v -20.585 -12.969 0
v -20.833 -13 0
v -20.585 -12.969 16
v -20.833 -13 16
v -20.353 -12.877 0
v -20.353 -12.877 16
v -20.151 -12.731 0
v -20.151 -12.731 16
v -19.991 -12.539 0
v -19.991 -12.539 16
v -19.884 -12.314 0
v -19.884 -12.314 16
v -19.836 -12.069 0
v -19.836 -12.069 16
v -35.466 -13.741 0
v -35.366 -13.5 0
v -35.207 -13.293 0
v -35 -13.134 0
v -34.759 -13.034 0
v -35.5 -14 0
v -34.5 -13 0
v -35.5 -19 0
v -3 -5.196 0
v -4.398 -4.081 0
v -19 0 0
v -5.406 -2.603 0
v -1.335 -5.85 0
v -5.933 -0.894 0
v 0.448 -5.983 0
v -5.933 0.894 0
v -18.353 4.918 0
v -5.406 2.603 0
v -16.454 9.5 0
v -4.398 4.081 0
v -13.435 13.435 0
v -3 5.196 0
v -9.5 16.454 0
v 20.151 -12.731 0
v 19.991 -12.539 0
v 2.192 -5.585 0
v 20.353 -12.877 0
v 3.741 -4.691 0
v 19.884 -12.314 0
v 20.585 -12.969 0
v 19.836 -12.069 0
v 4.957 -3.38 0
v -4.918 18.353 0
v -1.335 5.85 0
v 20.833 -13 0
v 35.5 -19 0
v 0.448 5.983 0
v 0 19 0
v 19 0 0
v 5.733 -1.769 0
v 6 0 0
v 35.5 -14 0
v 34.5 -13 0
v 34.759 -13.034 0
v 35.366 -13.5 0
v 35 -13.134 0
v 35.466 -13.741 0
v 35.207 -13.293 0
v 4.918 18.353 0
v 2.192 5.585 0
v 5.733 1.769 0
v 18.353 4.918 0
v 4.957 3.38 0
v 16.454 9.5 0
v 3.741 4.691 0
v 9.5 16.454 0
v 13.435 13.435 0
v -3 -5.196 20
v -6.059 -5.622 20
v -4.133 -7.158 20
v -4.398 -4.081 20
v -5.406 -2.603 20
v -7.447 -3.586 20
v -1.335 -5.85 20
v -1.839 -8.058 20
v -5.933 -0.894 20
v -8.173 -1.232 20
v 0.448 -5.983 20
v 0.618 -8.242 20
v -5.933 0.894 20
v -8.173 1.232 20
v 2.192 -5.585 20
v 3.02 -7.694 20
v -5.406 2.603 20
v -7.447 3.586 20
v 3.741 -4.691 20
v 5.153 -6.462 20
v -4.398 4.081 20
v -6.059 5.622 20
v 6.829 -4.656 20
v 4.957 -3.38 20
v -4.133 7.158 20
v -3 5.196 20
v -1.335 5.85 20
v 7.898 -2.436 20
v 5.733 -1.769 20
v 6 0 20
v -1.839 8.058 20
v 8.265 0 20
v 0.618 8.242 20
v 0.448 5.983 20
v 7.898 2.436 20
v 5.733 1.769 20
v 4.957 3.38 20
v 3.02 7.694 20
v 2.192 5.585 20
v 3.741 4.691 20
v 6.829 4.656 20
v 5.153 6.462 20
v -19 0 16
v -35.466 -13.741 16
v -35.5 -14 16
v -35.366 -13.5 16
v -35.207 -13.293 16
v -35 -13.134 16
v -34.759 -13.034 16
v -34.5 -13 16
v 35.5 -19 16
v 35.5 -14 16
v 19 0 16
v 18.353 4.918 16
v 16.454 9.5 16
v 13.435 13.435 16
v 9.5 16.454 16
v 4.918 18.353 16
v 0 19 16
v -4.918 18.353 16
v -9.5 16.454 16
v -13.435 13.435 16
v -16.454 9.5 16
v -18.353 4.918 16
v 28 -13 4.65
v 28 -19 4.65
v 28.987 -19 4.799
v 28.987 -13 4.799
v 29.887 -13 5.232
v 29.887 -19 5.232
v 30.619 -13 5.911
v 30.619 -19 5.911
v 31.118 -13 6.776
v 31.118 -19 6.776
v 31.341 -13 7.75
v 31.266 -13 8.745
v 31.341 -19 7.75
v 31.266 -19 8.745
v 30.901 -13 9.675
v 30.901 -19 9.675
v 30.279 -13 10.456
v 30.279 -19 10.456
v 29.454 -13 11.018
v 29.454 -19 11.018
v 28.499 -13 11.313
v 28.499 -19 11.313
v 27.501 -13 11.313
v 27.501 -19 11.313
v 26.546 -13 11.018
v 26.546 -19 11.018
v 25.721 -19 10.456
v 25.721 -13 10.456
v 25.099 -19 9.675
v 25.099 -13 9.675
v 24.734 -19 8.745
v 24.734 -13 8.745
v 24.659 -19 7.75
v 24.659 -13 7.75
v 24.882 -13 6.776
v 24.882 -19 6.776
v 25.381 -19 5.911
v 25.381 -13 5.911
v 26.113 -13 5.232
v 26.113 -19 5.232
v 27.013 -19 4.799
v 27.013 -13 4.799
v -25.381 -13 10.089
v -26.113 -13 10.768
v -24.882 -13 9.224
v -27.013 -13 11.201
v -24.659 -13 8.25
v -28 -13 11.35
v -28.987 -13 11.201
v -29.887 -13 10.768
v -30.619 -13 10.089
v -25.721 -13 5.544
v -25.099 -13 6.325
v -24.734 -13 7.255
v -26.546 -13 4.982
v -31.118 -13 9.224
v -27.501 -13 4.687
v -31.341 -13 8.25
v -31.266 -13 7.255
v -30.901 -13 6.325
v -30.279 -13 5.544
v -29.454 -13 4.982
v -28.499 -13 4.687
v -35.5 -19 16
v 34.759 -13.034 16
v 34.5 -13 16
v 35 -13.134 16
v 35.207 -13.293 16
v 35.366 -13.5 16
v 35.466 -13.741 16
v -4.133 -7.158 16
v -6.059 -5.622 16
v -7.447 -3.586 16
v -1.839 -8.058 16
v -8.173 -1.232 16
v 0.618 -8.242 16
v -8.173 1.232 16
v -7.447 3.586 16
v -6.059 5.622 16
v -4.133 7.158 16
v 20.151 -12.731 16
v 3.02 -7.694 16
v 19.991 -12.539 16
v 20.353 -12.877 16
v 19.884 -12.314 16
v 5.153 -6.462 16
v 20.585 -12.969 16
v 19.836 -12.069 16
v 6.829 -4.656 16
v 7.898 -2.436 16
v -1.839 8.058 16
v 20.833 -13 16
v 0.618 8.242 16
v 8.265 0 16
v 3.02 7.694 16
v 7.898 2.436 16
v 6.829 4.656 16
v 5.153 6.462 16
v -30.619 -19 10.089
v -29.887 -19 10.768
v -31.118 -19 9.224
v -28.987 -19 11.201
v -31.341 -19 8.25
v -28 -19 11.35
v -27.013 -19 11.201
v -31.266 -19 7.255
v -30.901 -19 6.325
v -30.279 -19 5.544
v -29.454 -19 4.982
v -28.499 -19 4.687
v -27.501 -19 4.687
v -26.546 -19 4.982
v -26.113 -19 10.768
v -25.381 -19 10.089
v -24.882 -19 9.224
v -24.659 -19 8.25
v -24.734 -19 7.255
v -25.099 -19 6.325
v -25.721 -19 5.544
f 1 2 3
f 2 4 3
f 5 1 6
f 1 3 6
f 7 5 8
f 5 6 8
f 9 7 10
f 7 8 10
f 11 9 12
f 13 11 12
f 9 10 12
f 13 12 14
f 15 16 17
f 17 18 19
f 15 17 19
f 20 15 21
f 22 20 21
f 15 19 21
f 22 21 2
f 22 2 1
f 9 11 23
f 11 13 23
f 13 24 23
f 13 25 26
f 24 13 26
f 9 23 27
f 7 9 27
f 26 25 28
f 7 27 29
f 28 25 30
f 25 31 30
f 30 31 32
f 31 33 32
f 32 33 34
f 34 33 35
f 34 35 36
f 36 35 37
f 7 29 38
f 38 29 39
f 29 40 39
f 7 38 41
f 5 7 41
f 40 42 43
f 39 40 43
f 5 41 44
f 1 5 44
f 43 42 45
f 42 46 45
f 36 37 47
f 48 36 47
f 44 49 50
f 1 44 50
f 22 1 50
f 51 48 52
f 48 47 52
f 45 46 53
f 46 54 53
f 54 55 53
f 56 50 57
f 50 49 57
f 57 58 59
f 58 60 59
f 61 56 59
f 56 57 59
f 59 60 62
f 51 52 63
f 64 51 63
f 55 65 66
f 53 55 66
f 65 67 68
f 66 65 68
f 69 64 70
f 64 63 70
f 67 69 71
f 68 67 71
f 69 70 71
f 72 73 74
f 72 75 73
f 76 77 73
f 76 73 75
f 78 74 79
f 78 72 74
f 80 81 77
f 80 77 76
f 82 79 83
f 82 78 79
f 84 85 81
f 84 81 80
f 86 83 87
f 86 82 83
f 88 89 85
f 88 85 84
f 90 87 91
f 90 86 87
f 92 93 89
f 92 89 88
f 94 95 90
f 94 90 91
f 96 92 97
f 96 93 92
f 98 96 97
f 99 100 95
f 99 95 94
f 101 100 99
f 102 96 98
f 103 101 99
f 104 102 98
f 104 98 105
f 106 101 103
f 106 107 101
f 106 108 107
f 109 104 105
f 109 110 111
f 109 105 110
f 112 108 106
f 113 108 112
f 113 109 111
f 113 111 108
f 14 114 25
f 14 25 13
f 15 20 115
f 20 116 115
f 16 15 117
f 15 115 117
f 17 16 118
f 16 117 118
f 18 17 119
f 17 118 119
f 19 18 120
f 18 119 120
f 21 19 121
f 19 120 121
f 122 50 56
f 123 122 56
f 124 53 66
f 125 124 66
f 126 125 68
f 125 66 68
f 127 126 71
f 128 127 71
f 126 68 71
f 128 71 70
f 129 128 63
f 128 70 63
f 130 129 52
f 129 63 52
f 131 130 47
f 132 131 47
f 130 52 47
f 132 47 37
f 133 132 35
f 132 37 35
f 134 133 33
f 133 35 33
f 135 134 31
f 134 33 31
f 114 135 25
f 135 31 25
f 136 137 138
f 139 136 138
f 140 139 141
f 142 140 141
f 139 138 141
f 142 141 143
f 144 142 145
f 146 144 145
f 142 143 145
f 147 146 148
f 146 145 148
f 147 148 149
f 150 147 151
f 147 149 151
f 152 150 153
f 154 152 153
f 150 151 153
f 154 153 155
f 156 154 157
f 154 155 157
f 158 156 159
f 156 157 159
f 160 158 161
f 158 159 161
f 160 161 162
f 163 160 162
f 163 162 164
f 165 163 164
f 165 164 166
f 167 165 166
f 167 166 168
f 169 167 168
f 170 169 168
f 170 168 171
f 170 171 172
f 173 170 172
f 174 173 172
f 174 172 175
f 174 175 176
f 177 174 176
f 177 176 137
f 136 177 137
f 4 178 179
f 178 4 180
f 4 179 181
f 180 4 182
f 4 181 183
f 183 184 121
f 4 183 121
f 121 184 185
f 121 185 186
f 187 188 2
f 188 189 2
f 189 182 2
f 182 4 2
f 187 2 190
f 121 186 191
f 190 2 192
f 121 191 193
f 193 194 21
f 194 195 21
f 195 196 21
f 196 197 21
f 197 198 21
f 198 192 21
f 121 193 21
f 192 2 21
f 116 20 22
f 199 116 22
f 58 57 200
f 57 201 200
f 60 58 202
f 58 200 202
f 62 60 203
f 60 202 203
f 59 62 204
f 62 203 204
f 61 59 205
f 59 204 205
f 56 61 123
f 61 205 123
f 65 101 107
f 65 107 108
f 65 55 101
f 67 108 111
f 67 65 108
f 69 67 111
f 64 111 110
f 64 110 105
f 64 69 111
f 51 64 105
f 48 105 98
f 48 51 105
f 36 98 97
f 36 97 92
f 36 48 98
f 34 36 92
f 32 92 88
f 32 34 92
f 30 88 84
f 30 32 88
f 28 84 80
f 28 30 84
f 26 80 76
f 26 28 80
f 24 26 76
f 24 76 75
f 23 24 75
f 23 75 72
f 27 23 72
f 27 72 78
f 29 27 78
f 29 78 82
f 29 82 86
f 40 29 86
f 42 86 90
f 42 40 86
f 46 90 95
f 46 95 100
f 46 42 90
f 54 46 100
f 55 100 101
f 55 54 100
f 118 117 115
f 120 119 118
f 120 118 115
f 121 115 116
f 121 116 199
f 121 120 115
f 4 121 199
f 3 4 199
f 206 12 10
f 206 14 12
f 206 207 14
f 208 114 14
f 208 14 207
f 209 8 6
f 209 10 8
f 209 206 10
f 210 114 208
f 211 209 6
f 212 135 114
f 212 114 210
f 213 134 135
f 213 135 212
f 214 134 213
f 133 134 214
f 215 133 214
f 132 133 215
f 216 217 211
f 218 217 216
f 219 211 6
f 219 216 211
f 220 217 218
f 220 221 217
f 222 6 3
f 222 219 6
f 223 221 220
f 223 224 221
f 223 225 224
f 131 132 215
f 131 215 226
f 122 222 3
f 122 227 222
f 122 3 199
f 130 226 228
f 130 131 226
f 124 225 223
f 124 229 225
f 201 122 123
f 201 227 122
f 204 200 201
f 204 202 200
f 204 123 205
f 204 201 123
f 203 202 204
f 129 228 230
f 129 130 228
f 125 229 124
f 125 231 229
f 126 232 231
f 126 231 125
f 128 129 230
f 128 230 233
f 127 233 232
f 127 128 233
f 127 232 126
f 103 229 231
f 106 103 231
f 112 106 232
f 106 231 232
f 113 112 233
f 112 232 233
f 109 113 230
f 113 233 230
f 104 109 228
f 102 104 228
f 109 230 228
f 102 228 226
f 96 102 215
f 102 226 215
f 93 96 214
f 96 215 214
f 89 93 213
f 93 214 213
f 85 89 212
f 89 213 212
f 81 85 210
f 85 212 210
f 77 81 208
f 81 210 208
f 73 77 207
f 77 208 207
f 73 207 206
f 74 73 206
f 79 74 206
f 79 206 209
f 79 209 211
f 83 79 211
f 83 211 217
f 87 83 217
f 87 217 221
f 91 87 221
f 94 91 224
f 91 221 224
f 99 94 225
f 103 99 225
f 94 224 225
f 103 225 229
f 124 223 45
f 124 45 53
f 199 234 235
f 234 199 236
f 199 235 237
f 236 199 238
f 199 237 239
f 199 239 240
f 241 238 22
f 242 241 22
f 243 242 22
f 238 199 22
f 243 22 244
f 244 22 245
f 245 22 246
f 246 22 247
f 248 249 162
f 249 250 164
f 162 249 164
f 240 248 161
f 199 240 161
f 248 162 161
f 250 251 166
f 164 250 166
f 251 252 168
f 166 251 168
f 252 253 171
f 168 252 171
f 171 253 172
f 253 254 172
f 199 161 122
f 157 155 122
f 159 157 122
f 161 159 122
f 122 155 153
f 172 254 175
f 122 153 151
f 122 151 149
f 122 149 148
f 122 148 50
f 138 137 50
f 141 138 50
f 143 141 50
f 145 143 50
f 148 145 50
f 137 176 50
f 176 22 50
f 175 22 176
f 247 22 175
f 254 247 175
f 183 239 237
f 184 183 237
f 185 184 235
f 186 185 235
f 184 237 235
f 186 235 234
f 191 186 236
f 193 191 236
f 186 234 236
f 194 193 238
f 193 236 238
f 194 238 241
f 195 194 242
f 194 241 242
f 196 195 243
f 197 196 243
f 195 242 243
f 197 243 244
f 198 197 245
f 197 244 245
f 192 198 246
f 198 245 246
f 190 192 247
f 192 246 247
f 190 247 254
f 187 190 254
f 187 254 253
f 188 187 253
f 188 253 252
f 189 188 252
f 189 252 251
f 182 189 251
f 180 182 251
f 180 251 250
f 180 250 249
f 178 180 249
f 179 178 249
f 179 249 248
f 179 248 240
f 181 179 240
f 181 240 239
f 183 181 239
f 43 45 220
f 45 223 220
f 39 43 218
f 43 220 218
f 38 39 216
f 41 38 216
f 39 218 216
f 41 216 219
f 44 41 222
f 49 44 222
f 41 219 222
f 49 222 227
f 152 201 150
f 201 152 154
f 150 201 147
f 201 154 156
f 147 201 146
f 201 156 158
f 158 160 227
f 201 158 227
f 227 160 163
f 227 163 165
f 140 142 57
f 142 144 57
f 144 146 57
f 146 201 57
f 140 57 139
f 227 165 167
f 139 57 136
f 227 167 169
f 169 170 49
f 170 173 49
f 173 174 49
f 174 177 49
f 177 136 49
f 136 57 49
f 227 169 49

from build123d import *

# Parameters (mm, degrees)
SKETCH1_R           = 19
SKETCH1_R_2         = 6
BOSS_EXTRUDE1_DEPTH = 16
SKETCH2_R           = 8.265
SKETCH2_R_2         = 6
BOSS_EXTRUDE2_DEPTH = 4
FILLET1_R           = 1
CUT_EXTRUDE1_REACH  = 57.716
SKETCH3_R           = 3.35


with BuildPart() as part:
    # Sketch1 → Boss-Extrude1 (new body)
    # profile 1 of 3: a face of its own
    with BuildSketch(Plane.XY):
        with BuildLine():
            Line((-35.5, -13), (-35.5, -19))
            Line((-35.5, -19), (-3.6e-08, -19))
            ThreePointArc((-3.6e-08, -19), (-13.435028855, -13.43502883), (-19, 0))
            Line((-19, 0), (-19.9, -13))
            Line((-19.9, -13), (-35.5, -13))
        make_face()
    # profile 2 of 3: a face of its own
    with BuildSketch(Plane.XY):
        Circle(SKETCH1_R)
        Circle(SKETCH1_R_2, mode=Mode.SUBTRACT)
    # profile 3 of 3: a face of its own
    with BuildSketch(Plane.XY):
        with BuildLine():
            ThreePointArc((19, 0), (13.43502883, -13.435028855), (-3.6e-08, -19))
            Line((-3.6e-08, -19), (35.5, -19))
            Line((35.5, -19), (35.5, -13))
            Line((35.5, -13), (19.9, -13))
            Line((19.9, -13), (19, 0))
        make_face()
    extrude(amount=BOSS_EXTRUDE1_DEPTH)

    # Sketch2 → Boss-Extrude2 (add)
    with BuildSketch(Plane.XY.offset(16)):
        Circle(SKETCH2_R)
        Circle(SKETCH2_R_2, mode=Mode.SUBTRACT)
    extrude(amount=BOSS_EXTRUDE2_DEPTH)

    # Fillet1
    fillet1_edges = [part.edges().sort_by_distance(p)[0] for p in [
        (-35.5, -13, 8),
        (-19.9, -13, 8),
        (19.9, -13, 8),
        (35.5, -13, 8),
    ]]
    fillet(fillet1_edges, radius=FILLET1_R)

    # Sketch3 → Cut-Extrude1 (cut, up to next)
    with BuildSketch(Plane.XZ.offset(19), mode=Mode.PRIVATE) as cut_extrude1_sk1:
        with Locations(Location((28, 8, 0), (0, 0, 270))):
            Circle(SKETCH3_R)
    cut_extrude1_tool1 = extrude(cut_extrude1_sk1.sketch, amount=-CUT_EXTRUDE1_REACH, mode=Mode.PRIVATE) & part.part
    # Sketch3 → Cut-Extrude1 (cut, up to next)
    with BuildSketch(Plane.XZ.offset(19), mode=Mode.PRIVATE) as cut_extrude1_sk2:
        with Locations(Location((-28, 8, 0), (0, 0, 90))):
            Circle(SKETCH3_R)
    cut_extrude1_tool2 = extrude(cut_extrude1_sk2.sketch, amount=-CUT_EXTRUDE1_REACH, mode=Mode.PRIVATE) & part.part
    add(cut_extrude1_tool1.solids().sort_by_distance((28, -19, 8))[0], mode=Mode.SUBTRACT)
    add(cut_extrude1_tool2.solids().sort_by_distance((-28, -19, 8))[0], mode=Mode.SUBTRACT)


solid = part.part
